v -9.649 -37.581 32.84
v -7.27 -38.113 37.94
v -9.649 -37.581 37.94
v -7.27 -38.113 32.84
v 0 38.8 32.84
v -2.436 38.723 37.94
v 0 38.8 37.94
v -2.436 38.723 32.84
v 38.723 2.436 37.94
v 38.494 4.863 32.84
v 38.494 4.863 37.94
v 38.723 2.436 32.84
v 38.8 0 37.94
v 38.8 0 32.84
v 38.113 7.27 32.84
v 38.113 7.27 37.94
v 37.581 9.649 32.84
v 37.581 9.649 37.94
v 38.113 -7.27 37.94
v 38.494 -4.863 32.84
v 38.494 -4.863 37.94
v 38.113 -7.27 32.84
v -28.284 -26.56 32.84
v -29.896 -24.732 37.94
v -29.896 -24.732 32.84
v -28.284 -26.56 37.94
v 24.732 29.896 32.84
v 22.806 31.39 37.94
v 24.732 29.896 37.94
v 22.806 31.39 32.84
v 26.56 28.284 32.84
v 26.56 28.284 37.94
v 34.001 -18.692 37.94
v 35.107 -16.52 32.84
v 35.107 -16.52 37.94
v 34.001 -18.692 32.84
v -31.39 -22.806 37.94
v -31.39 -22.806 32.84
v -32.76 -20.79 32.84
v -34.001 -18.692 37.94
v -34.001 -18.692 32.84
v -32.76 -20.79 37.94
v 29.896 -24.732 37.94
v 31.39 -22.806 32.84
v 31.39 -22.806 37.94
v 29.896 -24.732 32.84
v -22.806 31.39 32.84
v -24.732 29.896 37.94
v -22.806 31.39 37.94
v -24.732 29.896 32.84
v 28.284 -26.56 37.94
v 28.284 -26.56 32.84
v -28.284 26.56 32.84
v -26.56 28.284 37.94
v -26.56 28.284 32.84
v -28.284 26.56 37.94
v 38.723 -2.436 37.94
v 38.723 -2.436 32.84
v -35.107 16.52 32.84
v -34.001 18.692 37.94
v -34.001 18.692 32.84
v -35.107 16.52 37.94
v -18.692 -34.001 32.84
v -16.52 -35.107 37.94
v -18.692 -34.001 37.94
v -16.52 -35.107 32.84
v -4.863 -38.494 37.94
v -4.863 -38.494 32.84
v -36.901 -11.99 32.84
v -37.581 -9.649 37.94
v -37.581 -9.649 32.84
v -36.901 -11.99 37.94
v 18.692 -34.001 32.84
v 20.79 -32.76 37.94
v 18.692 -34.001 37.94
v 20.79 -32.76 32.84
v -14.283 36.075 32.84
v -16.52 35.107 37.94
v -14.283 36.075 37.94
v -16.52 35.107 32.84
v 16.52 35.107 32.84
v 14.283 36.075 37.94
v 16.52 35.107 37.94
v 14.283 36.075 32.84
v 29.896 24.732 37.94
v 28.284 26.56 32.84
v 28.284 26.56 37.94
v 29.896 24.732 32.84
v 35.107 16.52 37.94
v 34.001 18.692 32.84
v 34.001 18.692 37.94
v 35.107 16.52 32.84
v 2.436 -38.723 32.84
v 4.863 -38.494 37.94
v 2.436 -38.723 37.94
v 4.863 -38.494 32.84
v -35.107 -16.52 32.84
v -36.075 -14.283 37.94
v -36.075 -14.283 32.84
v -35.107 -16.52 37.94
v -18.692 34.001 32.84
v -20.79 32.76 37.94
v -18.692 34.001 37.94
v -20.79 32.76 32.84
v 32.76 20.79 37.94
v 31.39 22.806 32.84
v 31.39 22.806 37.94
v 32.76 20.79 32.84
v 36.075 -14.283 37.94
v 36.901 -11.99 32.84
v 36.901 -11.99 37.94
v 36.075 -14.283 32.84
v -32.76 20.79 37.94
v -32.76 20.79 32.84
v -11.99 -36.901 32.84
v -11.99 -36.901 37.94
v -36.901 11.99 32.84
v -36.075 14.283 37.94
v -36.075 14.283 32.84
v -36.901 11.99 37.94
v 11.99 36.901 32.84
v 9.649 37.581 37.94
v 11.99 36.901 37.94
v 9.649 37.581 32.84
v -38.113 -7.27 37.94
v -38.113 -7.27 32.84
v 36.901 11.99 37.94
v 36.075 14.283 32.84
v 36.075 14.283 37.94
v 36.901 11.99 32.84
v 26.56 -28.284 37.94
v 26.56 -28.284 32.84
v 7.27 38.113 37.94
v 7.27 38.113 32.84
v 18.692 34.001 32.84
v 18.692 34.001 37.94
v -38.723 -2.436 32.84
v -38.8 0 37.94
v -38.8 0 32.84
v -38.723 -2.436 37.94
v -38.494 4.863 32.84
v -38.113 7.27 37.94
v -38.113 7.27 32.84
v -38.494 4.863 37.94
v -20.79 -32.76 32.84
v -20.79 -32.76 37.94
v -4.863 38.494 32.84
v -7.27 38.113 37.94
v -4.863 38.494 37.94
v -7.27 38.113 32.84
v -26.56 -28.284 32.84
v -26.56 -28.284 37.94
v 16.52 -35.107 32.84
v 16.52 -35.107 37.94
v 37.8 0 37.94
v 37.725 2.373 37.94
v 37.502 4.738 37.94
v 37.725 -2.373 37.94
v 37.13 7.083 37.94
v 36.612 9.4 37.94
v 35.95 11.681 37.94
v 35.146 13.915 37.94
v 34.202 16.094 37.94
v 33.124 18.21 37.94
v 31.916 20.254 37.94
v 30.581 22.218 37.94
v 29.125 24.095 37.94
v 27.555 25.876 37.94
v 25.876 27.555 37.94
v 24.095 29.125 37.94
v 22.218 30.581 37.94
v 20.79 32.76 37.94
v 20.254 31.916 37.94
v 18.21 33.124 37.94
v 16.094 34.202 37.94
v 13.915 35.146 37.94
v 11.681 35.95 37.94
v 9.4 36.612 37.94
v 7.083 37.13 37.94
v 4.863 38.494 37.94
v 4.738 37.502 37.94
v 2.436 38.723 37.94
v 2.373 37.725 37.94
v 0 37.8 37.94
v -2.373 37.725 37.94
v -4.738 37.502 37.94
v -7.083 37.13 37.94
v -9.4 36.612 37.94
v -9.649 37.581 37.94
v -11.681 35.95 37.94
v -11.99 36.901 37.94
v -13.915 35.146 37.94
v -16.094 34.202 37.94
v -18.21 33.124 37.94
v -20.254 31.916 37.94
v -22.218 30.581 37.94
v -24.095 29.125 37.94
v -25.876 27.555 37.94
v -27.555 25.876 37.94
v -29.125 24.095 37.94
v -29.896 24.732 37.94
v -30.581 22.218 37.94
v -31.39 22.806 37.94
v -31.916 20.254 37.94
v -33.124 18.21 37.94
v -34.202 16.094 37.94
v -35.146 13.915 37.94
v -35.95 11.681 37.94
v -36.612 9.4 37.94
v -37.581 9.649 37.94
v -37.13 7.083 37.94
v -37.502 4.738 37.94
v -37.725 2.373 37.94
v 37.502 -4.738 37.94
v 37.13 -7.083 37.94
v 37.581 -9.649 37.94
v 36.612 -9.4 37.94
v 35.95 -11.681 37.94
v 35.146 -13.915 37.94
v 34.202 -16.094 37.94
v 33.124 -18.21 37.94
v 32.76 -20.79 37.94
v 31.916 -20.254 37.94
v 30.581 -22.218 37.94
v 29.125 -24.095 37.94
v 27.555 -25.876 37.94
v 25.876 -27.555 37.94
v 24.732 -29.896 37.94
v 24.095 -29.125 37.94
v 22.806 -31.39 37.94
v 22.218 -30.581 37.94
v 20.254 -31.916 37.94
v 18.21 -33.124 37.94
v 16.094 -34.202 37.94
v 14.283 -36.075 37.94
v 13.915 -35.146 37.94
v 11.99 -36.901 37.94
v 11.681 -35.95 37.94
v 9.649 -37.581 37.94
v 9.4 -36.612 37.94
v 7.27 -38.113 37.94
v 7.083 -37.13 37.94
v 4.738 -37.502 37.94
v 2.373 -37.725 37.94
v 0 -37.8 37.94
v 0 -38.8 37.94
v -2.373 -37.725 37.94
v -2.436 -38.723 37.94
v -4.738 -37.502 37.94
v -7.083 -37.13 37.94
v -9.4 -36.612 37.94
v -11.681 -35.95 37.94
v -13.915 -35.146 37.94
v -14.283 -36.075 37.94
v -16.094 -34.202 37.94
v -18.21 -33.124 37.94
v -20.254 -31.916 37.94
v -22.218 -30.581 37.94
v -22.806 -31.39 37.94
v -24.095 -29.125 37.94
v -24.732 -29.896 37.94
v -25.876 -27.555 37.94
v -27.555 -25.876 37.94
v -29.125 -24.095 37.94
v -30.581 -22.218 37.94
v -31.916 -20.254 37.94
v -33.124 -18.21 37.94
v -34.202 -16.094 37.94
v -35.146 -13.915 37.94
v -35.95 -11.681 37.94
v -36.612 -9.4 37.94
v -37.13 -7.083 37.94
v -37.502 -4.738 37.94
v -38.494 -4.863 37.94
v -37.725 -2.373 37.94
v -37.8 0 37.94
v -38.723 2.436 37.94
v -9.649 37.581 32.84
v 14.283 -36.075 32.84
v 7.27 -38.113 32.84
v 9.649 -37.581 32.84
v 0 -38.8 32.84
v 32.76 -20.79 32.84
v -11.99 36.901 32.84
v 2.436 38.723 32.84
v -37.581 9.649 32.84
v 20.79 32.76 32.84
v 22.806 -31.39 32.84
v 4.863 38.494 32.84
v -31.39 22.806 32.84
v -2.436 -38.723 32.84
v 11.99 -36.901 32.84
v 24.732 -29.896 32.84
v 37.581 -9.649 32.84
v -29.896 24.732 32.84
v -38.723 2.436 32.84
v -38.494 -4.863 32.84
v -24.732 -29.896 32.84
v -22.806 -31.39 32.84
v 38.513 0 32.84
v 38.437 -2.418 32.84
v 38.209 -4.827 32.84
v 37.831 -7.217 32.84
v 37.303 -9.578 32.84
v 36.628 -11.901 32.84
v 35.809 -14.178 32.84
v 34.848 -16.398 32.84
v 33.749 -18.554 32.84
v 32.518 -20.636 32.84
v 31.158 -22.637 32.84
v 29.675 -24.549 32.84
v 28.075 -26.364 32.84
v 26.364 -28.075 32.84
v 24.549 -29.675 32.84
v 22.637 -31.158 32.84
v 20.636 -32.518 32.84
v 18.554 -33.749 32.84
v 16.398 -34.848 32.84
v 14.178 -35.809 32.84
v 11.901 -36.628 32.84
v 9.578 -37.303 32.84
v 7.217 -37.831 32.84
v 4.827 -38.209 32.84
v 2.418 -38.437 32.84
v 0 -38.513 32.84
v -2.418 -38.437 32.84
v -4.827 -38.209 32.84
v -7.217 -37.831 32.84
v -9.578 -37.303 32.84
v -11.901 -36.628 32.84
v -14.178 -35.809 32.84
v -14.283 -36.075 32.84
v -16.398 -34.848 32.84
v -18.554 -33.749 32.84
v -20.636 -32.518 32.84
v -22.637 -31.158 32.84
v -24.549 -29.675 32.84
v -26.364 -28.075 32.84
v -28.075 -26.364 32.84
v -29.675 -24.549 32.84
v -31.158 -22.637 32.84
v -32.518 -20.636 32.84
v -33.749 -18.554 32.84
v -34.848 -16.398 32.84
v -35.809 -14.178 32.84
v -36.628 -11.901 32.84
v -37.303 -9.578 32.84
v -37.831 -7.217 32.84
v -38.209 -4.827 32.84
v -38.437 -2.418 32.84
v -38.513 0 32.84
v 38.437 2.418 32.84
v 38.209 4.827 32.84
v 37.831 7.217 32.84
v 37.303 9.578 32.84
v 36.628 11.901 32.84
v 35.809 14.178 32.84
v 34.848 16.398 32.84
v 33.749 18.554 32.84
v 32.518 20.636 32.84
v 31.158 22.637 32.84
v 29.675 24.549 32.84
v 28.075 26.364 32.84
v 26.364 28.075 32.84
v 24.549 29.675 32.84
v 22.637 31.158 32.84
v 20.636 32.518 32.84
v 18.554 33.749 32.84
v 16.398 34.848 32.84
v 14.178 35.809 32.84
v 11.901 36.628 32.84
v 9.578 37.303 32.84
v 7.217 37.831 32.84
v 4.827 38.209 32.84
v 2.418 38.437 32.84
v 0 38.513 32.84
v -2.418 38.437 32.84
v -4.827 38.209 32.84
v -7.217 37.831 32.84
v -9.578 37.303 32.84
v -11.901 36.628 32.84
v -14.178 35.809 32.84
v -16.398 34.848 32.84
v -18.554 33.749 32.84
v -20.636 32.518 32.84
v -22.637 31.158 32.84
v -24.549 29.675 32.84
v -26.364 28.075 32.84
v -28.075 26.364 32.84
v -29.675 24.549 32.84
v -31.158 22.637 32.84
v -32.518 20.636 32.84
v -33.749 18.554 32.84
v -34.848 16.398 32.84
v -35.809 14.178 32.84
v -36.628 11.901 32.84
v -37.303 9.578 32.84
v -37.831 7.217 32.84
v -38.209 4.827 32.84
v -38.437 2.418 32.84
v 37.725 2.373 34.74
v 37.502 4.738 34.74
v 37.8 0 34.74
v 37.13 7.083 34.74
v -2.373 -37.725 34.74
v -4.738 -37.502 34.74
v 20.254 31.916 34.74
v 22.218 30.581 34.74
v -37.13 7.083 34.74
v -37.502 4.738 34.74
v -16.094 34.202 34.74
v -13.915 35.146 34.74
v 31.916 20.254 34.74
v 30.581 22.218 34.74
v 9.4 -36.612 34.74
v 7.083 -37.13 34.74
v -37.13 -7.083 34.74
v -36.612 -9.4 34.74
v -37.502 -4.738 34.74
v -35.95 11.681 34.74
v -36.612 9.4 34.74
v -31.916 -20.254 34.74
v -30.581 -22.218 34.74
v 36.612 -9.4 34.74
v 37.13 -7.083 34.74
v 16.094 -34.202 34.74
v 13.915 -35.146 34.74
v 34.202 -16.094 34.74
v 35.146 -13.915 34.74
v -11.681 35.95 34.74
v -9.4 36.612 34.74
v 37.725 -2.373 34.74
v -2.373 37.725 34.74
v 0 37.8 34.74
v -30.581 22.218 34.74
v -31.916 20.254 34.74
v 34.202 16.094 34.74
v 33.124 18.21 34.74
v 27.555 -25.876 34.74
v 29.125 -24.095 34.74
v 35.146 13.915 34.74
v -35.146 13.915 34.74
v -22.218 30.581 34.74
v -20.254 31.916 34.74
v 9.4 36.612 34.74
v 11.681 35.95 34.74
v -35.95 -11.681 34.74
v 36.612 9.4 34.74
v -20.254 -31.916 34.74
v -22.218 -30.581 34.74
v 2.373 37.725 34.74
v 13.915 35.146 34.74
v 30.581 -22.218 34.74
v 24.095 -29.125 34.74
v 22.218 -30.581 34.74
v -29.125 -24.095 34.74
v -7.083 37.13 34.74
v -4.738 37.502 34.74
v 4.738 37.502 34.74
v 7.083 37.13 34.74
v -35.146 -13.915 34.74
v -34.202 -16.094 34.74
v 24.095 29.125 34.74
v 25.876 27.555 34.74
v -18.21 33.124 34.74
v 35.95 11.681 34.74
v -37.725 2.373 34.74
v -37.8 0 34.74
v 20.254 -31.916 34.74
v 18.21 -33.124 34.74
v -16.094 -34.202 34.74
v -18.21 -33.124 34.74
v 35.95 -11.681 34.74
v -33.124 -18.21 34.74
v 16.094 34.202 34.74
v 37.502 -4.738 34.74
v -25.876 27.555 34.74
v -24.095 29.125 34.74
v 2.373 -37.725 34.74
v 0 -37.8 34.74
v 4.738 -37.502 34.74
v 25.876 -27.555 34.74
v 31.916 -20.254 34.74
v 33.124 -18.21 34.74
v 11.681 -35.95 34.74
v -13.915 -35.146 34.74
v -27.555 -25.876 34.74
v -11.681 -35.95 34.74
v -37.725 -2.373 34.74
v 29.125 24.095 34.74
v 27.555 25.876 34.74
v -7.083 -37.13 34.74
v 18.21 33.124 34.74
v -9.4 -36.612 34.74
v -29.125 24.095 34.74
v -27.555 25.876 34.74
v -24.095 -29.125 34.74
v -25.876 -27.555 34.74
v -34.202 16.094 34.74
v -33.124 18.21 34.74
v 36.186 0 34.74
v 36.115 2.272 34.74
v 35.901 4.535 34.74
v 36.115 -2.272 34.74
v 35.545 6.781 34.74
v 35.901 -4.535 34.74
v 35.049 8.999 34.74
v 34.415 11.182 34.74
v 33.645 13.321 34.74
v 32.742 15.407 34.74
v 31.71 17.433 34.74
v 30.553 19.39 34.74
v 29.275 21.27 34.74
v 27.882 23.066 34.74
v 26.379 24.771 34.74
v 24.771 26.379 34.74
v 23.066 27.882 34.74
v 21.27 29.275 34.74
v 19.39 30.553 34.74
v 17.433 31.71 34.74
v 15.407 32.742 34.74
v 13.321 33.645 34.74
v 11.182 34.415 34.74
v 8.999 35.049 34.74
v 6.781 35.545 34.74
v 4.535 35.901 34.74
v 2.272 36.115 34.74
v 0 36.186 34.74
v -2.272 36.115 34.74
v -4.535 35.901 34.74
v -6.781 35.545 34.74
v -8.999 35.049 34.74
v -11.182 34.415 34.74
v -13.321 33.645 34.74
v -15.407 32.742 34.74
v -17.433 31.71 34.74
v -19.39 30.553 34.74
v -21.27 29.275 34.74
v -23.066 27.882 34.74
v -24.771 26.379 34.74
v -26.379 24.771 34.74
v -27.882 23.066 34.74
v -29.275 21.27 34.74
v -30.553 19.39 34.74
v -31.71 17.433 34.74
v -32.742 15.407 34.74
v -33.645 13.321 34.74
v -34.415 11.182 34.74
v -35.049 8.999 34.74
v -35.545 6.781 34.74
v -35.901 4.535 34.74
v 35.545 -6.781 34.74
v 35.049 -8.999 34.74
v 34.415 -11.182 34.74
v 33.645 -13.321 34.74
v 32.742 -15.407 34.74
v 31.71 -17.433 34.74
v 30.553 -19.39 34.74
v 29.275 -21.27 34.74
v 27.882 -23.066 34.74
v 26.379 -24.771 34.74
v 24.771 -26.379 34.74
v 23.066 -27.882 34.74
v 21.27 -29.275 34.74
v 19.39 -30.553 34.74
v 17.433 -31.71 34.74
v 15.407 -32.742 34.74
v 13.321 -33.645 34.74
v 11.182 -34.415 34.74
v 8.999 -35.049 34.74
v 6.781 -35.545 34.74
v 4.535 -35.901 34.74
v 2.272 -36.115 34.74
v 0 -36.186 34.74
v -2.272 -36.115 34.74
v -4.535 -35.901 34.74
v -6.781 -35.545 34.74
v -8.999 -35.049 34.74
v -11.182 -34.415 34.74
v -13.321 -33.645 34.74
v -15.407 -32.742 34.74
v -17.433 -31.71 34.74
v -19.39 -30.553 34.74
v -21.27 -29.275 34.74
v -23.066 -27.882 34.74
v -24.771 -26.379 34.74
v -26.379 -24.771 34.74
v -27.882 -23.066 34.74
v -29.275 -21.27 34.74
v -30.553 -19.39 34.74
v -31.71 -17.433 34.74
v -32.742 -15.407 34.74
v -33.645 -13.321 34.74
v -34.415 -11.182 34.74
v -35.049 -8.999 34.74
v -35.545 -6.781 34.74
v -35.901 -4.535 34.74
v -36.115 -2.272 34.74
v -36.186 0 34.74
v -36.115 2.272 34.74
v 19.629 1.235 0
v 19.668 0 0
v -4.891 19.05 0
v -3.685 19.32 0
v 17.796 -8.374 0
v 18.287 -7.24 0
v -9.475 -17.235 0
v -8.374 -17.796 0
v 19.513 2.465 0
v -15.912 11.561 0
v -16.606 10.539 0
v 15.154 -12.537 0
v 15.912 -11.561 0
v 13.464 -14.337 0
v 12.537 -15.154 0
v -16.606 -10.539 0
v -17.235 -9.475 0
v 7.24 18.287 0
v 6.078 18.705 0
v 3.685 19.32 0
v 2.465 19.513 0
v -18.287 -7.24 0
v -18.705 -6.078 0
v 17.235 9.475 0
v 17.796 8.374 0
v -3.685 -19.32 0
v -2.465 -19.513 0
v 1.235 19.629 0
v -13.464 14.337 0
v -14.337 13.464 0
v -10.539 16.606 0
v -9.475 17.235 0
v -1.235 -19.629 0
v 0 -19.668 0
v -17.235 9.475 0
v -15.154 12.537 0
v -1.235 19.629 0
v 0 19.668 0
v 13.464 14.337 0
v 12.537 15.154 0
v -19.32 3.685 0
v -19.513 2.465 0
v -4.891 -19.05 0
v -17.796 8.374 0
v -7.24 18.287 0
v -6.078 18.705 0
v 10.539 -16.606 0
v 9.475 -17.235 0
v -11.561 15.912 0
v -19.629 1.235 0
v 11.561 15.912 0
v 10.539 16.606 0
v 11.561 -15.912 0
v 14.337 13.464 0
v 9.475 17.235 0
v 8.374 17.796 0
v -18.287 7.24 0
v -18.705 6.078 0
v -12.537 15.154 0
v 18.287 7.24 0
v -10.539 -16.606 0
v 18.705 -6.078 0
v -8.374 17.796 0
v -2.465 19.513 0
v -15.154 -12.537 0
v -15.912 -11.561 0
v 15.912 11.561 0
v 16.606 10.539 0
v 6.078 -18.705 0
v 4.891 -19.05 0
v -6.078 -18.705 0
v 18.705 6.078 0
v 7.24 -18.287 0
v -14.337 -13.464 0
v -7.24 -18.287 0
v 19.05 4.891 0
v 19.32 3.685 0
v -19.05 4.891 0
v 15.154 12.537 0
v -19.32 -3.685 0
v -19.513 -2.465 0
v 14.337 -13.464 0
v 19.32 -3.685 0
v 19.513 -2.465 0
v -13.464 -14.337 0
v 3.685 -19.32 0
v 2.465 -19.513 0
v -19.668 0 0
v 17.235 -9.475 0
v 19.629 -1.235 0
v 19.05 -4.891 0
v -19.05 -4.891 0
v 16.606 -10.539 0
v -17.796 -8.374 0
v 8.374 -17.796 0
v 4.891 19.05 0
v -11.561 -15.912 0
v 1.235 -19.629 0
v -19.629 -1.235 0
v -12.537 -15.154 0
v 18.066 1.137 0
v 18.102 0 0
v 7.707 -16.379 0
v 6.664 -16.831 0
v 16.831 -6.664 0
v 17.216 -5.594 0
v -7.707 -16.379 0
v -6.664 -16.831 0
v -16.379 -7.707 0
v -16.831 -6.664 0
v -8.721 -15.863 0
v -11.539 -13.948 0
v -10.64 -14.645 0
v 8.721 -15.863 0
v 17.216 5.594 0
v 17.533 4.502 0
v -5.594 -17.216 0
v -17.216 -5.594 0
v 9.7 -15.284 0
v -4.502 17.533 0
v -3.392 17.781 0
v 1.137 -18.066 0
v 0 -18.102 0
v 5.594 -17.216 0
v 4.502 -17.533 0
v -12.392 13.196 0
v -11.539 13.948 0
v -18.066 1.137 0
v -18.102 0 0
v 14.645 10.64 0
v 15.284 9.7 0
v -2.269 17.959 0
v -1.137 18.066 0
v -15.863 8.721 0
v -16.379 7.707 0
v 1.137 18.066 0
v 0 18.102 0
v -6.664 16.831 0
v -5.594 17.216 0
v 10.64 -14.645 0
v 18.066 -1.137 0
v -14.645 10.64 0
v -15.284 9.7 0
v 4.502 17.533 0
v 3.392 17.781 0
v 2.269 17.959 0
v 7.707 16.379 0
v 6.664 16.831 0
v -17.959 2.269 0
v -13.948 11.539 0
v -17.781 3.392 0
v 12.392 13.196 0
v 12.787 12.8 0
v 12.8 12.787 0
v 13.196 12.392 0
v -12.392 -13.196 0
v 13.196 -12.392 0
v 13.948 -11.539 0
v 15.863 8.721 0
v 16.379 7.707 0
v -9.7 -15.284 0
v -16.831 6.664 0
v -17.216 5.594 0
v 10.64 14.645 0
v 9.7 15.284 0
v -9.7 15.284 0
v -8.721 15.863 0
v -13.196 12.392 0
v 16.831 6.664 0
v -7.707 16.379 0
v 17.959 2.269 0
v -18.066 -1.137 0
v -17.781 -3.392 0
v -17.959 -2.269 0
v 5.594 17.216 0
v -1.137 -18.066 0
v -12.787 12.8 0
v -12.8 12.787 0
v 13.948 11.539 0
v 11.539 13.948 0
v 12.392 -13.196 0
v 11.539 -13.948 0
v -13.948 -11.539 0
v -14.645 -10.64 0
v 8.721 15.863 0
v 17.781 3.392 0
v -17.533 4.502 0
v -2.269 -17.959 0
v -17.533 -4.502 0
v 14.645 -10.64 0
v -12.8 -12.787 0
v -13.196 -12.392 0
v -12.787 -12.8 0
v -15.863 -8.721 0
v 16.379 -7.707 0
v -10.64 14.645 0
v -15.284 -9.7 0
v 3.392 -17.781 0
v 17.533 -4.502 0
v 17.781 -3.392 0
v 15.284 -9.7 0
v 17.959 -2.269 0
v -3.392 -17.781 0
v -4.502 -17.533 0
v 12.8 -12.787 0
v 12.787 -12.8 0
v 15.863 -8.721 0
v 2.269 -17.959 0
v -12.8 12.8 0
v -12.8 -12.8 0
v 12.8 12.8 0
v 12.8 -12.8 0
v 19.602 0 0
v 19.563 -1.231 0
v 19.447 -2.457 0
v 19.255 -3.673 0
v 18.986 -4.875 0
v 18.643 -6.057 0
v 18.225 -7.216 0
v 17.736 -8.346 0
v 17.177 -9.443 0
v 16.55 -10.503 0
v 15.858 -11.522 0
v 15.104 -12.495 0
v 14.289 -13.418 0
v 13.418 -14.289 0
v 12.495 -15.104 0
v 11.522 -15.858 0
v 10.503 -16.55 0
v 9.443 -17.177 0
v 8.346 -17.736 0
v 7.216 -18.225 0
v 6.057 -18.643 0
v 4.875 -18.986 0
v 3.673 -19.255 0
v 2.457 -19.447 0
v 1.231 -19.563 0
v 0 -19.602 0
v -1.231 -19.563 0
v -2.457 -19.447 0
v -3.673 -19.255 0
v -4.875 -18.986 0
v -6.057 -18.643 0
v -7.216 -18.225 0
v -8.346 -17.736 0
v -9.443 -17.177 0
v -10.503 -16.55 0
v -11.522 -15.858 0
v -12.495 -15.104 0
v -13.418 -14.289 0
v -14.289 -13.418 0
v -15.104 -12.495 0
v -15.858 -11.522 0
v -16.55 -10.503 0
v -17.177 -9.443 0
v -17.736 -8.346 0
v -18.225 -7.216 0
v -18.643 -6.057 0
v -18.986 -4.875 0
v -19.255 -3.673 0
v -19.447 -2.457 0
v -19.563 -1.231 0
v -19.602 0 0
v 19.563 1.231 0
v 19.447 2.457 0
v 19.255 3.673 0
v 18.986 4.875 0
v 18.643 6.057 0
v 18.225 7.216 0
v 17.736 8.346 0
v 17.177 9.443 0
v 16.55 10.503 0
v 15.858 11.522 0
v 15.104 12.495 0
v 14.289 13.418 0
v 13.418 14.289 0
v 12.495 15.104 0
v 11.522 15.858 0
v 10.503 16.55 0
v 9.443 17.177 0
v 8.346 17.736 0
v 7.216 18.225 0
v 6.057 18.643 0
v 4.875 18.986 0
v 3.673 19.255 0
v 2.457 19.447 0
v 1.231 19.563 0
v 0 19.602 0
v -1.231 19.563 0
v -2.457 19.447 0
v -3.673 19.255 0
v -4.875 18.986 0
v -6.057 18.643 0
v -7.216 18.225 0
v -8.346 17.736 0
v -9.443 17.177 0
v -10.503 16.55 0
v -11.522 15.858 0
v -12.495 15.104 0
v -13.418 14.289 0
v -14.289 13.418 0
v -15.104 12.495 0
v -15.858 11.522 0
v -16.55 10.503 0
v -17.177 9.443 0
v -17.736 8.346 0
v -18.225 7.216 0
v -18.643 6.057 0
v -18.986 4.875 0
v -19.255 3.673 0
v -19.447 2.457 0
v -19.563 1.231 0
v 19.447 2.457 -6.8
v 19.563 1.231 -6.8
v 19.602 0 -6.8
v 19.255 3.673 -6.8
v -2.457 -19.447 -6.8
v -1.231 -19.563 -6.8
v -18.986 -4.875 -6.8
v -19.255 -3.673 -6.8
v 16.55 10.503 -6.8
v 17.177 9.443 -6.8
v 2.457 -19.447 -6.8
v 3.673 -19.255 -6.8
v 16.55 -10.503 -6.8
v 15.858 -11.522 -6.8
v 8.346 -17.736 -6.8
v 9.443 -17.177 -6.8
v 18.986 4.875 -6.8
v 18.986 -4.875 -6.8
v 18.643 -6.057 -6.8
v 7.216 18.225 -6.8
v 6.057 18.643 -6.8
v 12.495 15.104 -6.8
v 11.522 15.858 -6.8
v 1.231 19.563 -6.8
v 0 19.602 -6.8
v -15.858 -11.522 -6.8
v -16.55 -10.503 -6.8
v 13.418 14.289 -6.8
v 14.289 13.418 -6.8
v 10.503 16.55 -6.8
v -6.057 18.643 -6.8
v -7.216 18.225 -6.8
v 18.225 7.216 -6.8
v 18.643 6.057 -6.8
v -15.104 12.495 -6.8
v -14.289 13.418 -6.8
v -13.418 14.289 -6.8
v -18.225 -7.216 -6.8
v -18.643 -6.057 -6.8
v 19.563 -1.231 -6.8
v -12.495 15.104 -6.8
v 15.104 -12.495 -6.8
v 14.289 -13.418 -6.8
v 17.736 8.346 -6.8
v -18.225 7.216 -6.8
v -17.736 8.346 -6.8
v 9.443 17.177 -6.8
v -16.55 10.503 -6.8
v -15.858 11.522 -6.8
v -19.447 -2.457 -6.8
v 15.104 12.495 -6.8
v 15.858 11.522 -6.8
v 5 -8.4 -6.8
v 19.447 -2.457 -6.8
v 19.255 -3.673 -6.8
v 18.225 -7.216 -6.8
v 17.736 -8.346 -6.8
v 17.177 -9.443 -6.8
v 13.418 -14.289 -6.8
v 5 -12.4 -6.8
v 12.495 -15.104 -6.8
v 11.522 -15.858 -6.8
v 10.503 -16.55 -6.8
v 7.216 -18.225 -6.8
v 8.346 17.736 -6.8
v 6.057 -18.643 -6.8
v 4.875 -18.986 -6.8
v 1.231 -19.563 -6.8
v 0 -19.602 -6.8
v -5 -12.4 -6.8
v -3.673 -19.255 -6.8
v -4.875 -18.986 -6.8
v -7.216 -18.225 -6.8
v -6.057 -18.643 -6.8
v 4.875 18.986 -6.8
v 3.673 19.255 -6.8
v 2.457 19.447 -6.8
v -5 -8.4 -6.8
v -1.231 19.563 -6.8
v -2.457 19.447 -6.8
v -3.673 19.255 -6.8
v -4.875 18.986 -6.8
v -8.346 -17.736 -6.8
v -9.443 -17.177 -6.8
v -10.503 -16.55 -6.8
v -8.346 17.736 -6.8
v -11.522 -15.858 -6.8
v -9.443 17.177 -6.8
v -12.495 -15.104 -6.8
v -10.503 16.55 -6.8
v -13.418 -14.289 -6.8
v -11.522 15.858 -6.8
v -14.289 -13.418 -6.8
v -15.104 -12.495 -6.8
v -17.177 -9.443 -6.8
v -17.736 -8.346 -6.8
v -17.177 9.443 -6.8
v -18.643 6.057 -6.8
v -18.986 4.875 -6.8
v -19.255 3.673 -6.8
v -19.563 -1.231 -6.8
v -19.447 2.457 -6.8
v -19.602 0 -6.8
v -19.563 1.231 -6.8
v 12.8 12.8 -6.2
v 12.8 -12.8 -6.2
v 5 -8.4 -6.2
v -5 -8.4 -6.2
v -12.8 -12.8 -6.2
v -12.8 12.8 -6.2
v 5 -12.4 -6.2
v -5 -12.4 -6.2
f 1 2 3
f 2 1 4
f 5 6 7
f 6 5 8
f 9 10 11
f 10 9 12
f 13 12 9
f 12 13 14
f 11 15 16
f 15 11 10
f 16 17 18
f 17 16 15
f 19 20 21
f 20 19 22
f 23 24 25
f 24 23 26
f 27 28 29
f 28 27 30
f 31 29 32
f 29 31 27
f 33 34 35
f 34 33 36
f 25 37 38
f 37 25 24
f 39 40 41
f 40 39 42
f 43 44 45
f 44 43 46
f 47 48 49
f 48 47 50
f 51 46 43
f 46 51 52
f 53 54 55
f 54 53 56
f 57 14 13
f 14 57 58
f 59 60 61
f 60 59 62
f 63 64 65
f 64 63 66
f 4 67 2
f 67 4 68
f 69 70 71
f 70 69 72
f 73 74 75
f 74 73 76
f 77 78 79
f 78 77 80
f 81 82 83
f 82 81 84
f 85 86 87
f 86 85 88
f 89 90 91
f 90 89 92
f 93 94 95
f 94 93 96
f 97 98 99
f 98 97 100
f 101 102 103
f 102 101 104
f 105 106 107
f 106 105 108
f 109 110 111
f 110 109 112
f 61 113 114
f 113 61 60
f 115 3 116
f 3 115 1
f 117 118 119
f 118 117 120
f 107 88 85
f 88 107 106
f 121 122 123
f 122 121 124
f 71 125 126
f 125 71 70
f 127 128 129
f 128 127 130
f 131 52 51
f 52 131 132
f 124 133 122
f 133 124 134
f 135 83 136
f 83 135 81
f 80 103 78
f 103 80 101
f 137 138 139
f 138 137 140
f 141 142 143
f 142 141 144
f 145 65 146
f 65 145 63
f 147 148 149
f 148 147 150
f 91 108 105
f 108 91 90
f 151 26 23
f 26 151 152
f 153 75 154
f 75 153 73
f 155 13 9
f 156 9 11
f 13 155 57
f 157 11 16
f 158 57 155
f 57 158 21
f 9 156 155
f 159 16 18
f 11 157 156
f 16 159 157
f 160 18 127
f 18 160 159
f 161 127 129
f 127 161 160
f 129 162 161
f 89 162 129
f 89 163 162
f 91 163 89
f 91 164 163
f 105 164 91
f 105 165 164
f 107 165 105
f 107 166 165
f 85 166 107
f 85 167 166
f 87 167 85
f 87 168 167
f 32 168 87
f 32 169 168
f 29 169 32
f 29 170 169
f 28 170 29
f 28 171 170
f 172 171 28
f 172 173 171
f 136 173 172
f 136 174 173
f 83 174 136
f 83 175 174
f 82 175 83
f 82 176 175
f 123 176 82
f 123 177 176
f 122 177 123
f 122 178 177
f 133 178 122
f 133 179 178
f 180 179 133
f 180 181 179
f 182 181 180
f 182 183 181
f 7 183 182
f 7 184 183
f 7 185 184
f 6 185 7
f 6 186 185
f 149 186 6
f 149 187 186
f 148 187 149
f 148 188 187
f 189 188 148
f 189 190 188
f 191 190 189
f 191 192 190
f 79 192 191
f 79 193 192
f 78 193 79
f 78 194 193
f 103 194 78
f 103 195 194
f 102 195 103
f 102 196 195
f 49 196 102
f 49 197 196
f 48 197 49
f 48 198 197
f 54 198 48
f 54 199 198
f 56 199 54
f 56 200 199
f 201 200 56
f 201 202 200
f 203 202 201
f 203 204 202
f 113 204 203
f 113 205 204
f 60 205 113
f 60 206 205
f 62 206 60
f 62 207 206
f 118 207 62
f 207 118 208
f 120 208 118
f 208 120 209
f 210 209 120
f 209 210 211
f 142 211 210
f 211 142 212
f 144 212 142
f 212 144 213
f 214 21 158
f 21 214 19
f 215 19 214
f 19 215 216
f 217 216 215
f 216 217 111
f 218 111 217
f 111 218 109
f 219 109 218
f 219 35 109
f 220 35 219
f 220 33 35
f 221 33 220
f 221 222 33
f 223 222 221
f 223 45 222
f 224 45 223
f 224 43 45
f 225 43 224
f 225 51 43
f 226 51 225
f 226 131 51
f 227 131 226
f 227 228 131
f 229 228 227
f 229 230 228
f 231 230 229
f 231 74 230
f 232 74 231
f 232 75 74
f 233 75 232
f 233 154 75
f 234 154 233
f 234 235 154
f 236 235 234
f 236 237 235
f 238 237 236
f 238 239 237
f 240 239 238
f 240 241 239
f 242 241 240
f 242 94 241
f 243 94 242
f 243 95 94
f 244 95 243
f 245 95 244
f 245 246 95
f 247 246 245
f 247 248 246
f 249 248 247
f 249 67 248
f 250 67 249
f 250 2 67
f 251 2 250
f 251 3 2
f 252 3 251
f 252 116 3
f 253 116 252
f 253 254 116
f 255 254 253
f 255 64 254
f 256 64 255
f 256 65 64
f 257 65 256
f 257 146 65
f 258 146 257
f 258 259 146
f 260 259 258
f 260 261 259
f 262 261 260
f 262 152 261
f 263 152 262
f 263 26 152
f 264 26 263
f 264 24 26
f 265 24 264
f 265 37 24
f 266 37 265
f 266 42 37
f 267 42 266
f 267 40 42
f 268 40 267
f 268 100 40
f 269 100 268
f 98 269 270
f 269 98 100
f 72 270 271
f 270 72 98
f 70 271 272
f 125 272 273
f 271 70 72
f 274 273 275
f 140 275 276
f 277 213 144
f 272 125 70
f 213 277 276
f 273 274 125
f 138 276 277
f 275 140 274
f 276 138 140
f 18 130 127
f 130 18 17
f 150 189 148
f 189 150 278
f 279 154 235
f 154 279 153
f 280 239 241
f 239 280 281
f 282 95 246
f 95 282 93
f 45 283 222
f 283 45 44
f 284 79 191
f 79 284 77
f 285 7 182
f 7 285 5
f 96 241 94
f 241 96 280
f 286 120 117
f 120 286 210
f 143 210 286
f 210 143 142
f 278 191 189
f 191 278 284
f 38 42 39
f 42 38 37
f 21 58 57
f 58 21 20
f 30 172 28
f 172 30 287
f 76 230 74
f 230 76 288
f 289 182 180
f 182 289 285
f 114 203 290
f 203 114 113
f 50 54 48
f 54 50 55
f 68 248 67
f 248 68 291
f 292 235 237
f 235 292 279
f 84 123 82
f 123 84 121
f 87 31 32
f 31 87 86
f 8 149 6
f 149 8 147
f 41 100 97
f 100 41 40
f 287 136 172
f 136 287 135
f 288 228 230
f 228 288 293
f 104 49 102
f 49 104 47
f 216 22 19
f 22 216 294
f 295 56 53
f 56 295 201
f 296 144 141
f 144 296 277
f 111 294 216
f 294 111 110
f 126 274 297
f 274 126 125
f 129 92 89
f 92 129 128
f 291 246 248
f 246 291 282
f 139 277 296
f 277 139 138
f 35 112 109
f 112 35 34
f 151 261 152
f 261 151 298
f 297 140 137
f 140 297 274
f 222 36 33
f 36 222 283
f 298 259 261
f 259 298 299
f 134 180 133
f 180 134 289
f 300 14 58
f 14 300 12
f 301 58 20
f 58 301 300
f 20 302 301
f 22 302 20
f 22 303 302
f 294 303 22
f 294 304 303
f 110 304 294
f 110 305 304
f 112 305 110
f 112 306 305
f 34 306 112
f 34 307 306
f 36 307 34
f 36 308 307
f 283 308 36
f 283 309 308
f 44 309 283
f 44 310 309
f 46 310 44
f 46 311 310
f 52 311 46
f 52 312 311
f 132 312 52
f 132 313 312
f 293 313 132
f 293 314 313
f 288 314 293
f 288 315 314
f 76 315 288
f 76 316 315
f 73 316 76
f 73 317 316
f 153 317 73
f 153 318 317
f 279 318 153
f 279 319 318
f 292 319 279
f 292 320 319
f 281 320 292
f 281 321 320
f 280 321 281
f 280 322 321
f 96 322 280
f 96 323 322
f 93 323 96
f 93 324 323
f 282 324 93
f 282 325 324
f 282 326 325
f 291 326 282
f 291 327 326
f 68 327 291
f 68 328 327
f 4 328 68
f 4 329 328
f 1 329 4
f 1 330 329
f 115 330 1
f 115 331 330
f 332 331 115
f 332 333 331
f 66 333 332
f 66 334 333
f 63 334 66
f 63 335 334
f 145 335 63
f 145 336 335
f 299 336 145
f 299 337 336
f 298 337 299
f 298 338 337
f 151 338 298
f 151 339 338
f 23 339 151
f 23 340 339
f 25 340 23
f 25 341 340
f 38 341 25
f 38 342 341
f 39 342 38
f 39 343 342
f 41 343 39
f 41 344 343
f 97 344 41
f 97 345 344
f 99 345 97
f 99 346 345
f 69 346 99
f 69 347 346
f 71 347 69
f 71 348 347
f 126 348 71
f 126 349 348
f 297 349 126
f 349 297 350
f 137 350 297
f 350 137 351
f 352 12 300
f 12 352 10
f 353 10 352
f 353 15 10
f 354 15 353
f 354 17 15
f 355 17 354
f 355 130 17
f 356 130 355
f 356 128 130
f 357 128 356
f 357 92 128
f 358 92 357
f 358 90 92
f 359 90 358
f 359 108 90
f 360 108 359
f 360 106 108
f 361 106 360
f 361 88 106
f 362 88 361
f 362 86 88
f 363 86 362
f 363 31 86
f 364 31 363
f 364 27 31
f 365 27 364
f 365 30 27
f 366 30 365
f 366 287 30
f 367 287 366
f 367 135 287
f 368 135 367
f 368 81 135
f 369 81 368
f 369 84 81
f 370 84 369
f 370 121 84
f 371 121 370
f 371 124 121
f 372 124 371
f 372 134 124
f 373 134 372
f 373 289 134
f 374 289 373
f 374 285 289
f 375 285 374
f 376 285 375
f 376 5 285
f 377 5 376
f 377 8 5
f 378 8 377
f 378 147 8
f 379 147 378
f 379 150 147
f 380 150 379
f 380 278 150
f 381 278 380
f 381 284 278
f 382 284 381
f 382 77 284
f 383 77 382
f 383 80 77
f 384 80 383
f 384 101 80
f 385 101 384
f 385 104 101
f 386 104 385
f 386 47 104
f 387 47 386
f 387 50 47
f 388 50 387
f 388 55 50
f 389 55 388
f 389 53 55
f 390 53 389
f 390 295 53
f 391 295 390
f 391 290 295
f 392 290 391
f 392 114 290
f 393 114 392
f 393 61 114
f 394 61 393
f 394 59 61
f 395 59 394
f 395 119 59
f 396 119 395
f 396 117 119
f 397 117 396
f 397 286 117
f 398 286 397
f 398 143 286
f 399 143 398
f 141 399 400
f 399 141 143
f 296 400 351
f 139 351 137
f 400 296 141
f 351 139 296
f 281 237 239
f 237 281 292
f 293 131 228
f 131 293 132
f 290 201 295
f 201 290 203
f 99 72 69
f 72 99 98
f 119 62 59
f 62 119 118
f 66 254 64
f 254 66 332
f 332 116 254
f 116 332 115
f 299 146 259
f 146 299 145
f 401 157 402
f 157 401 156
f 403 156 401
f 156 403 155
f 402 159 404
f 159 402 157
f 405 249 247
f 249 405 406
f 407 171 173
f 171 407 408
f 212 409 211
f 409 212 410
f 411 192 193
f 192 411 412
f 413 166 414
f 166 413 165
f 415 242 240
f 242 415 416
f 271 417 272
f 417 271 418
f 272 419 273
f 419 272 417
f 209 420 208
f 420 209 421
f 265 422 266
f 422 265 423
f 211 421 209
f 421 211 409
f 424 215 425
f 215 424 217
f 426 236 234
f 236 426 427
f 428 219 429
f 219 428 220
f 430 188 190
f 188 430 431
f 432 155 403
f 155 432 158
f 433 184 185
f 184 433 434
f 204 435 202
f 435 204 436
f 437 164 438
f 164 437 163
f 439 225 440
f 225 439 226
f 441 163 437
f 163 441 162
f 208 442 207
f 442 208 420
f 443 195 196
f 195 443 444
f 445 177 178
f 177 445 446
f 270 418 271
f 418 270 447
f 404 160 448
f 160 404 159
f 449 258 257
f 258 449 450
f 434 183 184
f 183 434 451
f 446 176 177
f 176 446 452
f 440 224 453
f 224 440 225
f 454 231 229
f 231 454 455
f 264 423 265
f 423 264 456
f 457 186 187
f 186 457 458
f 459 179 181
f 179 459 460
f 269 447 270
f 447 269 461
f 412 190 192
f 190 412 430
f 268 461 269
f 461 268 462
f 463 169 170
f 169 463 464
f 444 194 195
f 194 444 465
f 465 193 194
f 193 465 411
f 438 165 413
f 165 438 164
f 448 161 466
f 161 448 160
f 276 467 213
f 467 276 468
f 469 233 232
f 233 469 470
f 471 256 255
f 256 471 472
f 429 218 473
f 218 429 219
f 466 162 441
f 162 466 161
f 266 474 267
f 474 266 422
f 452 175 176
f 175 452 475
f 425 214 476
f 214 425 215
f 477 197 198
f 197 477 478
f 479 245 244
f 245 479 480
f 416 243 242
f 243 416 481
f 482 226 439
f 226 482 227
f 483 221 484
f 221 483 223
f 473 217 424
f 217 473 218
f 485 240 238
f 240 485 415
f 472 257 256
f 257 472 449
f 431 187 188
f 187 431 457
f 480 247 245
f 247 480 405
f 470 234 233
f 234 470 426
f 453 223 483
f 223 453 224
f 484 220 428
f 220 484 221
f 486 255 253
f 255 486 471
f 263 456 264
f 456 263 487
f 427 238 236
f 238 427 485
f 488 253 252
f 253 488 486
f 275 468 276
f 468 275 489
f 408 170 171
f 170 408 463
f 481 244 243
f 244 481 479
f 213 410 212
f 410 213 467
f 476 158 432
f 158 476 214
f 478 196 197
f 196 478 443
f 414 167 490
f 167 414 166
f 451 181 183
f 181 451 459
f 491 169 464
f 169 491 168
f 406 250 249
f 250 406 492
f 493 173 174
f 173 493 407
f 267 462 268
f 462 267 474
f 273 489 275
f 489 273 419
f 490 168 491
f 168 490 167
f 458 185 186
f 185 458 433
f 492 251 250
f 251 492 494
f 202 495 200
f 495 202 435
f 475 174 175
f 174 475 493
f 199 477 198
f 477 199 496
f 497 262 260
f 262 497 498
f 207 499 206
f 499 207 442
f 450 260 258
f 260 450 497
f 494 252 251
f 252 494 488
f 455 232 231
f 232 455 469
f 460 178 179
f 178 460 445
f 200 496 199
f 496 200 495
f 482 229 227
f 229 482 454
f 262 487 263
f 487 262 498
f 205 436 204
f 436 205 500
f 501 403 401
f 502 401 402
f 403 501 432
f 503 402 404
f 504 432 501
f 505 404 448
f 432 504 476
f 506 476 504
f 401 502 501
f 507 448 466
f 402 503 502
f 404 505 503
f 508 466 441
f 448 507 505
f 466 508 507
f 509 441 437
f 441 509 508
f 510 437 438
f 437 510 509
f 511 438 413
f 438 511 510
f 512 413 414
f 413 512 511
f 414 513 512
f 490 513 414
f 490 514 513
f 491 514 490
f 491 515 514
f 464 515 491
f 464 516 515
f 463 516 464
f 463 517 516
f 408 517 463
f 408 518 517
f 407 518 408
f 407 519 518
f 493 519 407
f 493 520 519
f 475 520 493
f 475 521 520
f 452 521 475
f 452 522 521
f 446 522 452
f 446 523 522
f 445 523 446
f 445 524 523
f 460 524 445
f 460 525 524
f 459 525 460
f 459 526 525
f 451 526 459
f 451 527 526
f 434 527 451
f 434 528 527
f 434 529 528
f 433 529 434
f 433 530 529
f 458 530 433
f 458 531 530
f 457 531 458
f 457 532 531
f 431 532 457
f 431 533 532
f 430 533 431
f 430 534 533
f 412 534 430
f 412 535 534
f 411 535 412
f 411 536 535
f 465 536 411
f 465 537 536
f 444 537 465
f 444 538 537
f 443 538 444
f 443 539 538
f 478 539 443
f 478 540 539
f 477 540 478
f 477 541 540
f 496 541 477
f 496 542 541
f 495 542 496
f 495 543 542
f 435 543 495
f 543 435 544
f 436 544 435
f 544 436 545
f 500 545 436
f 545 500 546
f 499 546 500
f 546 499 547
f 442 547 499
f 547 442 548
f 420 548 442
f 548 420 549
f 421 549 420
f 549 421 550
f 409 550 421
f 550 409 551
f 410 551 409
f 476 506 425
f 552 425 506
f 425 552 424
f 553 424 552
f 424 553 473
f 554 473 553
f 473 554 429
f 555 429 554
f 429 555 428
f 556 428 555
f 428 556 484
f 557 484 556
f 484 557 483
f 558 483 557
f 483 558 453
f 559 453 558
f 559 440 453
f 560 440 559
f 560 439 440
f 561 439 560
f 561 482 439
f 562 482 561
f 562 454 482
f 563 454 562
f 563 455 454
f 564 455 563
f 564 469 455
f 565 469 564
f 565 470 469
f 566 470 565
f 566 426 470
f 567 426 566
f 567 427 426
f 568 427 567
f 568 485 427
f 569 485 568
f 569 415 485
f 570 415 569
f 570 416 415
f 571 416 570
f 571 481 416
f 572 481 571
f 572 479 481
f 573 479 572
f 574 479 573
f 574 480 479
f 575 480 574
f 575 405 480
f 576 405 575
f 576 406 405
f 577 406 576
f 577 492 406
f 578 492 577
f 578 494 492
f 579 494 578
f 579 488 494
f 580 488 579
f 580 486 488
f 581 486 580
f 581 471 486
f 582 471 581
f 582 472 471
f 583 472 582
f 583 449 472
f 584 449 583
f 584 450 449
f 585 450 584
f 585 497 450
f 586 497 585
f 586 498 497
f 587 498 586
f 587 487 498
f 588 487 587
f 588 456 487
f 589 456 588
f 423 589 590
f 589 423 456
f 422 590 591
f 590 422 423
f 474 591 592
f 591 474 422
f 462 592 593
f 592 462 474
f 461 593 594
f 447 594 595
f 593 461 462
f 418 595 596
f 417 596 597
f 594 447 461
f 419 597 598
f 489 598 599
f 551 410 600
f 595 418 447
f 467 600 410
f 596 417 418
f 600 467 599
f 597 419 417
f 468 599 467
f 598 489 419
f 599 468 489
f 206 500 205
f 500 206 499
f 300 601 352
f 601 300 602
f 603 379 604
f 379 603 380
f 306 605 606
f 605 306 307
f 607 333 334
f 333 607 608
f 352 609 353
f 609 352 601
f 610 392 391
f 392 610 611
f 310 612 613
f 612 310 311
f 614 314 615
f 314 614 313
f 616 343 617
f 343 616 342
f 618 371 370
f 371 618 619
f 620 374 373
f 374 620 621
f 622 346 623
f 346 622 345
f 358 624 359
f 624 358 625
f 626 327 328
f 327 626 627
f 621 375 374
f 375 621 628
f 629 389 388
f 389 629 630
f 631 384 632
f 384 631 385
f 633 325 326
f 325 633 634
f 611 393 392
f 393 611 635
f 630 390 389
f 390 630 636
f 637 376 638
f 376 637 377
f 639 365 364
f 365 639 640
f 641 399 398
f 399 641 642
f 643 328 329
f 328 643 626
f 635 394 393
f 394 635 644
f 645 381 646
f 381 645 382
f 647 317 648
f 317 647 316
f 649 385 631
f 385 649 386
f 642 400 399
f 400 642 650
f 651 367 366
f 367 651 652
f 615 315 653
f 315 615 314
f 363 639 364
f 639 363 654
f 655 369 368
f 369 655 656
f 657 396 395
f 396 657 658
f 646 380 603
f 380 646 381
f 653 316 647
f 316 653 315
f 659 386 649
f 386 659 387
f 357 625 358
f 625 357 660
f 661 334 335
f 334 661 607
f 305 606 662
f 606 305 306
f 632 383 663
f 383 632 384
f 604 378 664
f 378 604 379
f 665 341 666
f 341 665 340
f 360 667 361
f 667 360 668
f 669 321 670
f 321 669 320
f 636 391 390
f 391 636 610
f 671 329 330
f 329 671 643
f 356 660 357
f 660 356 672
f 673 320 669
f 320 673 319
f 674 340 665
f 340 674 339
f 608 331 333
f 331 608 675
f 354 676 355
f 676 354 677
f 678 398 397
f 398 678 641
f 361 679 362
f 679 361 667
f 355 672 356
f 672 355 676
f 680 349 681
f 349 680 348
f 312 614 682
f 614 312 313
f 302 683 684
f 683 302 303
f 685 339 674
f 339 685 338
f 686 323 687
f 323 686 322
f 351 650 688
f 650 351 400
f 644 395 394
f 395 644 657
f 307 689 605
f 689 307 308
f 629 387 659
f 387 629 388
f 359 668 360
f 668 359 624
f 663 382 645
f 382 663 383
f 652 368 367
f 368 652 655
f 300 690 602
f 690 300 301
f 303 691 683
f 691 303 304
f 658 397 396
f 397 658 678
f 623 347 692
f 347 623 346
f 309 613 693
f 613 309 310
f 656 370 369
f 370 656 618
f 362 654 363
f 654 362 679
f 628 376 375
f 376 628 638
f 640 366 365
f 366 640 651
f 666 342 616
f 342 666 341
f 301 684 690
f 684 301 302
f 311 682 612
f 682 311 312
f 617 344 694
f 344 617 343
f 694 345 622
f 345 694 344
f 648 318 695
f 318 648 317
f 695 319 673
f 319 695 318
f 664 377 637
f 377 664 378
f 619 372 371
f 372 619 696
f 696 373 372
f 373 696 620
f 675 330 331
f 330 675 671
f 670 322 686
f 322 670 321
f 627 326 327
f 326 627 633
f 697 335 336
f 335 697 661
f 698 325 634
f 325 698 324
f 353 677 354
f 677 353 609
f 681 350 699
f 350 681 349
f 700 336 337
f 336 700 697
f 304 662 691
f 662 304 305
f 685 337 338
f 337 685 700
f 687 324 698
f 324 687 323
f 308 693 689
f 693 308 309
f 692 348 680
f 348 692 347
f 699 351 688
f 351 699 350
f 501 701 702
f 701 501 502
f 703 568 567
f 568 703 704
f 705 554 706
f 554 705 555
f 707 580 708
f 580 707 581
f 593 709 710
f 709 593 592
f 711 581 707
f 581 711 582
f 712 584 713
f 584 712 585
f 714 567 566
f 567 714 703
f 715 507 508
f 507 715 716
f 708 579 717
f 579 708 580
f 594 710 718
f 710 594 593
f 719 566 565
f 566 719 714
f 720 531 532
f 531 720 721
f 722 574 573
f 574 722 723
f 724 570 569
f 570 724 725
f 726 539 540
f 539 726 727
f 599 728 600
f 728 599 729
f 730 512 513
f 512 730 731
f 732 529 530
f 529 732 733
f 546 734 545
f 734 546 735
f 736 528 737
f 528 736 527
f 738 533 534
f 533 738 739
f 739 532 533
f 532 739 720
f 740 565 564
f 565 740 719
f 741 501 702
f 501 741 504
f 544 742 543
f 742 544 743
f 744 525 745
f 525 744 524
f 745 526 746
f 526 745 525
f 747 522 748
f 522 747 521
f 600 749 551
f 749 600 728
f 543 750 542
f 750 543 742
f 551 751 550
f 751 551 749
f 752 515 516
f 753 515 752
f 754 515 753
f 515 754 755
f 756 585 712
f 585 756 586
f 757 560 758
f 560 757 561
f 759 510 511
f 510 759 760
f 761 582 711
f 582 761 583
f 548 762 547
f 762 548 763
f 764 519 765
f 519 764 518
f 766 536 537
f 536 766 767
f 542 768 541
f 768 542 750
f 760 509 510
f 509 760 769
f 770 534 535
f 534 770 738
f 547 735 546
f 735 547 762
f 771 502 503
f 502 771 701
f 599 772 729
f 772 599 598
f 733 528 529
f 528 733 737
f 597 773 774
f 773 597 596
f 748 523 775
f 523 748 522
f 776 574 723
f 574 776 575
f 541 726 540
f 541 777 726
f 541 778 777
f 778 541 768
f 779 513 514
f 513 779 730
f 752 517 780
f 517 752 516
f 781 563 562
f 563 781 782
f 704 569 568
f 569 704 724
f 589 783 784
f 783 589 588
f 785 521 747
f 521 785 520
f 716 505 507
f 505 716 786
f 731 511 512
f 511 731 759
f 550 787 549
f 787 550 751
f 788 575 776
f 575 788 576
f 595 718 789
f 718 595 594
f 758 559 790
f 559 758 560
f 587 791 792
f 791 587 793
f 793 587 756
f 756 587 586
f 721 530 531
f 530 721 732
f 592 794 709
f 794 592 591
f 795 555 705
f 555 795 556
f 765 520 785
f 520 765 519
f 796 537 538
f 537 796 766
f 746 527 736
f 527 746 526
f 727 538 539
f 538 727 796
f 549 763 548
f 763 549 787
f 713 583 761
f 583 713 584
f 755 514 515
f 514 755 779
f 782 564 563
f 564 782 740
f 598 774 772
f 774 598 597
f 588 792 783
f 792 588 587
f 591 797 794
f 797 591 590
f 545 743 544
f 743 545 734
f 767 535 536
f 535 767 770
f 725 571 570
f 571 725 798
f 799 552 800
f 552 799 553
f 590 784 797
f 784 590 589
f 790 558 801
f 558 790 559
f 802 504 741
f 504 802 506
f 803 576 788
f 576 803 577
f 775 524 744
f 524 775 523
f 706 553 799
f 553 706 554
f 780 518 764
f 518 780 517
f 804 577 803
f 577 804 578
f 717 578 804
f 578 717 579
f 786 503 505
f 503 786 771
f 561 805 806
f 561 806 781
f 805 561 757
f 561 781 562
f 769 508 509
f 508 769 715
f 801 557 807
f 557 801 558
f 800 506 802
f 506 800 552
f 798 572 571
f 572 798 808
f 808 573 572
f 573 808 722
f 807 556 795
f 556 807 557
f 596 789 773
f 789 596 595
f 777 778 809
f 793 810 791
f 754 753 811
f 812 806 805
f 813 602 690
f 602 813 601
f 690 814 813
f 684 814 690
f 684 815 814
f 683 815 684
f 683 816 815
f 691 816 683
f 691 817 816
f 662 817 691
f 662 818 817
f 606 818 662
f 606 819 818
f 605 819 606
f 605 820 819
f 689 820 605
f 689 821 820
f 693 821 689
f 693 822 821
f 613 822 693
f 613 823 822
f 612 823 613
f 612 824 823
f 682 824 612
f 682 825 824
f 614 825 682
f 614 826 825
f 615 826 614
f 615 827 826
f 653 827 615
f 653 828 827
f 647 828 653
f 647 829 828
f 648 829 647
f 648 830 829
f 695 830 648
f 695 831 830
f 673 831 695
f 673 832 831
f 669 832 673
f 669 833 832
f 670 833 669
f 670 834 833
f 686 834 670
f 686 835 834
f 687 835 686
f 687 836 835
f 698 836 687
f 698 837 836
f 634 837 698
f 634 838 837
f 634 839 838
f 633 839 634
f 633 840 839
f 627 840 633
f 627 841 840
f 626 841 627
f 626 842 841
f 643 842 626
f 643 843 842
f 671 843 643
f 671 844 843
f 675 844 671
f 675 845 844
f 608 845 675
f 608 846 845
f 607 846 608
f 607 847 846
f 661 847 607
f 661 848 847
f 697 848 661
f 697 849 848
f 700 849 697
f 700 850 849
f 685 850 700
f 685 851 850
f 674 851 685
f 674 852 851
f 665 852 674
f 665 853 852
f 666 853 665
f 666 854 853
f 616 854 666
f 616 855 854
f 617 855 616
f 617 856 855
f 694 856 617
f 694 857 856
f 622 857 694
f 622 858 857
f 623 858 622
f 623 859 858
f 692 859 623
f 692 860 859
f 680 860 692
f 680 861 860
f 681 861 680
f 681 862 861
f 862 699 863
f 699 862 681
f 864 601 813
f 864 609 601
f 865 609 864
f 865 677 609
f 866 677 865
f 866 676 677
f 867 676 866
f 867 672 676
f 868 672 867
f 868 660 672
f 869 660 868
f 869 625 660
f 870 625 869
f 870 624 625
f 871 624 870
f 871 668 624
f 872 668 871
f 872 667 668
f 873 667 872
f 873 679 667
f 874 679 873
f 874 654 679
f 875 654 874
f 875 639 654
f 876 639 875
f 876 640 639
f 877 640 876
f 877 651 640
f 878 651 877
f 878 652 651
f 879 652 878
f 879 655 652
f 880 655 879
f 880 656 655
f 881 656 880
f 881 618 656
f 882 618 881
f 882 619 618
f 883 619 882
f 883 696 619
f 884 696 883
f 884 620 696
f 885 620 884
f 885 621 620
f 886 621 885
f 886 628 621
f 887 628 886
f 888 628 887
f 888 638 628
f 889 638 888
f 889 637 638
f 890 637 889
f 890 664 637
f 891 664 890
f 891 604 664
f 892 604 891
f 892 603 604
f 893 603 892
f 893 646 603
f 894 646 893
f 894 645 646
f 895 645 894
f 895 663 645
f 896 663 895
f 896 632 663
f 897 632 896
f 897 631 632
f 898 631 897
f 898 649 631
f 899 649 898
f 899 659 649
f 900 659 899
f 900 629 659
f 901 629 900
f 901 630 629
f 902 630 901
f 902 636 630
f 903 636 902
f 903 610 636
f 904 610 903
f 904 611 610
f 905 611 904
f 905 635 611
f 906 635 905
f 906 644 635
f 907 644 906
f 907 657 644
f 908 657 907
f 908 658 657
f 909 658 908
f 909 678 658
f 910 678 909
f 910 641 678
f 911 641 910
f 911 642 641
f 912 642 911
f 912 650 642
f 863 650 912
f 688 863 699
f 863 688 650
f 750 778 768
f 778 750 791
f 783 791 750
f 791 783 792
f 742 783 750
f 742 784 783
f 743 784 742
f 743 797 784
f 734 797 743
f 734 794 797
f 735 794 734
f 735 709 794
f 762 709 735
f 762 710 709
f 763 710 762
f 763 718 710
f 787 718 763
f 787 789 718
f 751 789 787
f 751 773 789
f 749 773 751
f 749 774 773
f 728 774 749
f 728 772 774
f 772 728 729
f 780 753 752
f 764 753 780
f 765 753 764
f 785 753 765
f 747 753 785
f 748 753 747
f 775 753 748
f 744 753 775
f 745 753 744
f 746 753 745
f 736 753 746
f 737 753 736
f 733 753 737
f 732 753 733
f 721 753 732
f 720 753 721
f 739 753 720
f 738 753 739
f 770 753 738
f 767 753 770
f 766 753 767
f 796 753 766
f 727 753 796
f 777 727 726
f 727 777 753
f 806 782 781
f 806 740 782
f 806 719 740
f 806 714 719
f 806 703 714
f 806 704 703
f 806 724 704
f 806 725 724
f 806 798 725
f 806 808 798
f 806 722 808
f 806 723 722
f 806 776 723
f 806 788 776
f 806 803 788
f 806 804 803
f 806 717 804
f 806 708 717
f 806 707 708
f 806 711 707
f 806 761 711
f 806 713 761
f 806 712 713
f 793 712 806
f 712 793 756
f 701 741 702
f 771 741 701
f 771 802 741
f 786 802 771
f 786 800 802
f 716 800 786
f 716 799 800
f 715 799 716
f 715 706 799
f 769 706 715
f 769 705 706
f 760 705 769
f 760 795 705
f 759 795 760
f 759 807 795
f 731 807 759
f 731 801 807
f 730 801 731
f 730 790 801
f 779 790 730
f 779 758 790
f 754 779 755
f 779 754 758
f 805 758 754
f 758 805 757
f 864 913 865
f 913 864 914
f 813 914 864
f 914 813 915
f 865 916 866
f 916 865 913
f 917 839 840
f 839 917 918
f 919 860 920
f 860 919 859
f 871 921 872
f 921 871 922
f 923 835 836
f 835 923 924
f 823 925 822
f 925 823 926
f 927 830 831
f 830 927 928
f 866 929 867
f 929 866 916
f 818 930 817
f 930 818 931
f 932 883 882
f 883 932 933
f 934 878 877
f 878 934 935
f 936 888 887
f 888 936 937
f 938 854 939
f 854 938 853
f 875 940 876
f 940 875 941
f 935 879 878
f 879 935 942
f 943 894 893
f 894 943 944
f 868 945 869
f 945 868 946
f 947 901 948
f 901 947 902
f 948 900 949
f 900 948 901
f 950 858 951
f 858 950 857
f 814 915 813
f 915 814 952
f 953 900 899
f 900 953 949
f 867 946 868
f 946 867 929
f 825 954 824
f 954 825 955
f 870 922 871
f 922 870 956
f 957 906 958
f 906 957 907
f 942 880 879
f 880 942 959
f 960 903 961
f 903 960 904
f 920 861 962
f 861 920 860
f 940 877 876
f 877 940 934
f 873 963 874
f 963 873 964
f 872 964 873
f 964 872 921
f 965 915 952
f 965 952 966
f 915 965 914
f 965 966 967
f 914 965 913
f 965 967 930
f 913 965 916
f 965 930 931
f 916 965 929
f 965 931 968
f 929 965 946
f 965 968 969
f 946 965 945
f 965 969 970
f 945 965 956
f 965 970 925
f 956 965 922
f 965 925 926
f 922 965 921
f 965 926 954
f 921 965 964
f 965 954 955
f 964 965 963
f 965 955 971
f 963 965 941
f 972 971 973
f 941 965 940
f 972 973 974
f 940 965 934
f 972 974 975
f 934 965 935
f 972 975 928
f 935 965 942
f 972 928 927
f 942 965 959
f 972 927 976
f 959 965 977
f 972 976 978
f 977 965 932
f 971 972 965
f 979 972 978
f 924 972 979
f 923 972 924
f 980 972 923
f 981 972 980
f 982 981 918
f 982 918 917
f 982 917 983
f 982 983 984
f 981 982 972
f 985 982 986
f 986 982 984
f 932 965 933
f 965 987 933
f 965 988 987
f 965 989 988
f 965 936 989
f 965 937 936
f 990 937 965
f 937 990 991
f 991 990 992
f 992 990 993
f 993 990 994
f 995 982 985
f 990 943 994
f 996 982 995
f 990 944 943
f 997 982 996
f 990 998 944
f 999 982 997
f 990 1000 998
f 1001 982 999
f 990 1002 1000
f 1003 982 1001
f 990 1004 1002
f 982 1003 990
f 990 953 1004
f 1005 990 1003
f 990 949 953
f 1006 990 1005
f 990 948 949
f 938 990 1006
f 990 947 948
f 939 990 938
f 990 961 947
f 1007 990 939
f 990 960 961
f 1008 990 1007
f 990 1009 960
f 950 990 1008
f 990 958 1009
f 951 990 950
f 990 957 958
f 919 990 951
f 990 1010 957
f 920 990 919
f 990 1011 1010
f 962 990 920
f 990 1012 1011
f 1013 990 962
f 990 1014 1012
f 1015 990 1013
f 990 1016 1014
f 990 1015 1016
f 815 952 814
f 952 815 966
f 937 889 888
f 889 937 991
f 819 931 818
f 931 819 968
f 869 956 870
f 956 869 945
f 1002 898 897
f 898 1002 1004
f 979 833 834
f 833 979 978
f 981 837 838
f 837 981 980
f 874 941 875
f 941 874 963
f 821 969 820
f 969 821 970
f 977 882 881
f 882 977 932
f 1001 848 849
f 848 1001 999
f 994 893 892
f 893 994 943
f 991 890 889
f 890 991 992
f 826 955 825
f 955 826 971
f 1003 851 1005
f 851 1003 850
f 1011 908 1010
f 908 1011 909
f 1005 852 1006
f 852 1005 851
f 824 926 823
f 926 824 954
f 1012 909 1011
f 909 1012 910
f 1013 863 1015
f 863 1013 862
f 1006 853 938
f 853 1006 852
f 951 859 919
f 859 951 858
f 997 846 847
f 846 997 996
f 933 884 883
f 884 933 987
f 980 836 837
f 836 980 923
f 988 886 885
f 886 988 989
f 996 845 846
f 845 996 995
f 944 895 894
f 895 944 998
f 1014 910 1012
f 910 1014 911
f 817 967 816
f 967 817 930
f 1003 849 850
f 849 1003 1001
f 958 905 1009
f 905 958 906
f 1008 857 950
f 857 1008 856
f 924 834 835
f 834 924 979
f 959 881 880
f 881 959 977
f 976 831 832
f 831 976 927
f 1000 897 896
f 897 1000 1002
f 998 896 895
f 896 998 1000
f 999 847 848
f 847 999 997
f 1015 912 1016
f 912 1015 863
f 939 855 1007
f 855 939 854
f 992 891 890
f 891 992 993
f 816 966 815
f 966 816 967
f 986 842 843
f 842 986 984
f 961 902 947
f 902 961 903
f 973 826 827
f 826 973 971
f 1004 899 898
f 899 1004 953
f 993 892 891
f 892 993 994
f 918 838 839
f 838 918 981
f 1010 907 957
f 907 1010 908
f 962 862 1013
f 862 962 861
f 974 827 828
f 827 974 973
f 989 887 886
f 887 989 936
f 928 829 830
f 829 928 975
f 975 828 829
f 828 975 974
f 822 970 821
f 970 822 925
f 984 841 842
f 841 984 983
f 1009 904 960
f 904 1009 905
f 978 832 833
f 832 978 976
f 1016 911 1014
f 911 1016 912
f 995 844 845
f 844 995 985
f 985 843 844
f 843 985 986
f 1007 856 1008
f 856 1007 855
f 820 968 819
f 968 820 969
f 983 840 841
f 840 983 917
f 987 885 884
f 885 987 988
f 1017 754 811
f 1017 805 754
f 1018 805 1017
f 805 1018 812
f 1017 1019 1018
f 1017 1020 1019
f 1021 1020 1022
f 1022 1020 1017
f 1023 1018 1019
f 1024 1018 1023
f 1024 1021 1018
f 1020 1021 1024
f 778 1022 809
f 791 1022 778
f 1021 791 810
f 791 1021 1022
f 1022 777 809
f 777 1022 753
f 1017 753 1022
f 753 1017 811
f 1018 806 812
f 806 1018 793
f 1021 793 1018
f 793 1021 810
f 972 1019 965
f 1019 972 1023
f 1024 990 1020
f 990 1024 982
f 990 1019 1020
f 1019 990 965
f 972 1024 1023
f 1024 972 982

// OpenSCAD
// ===  rect -> circular horn antenna
// ===  J.Beale August 23 2018

e1 = 0.2;       // tolerance for ID shrink
OD1 = 75.4+e1;	// OD of "3-inch" round retroreflector
RFZ2 = 4.8;    // full z-height of round reflector
RFZ = 3.1;     // z-height step of round ref. edge
RFWT = 1;     // front lip wall thickness
ODFL = OD1 + (RFWT*2);  // OD of front lip
RFZE = 2;      // extra Z overlap with cone

e = 0.4;        // extra ID for slop
TXD = 25.2+e;	// Transmitter PCB X dim
TYD = 25.2+e;   // Transmitter PCB Y DIM
// OA1 = 36;     // opening angle of horn in degrees
OA1 = 55;     // opening angle of horn in degrees
TH1 = 0.8;    // wall thickness of horn

PCBZ = 6.8;     // z-height of PCB mounting
phX = 10;       // length of hole for PCB pins
phY = 4;        // width of hold for pins
phZ = 50;       // height of cutout block for pins
phYT = -10.4;   // Y axis translation of hole from center

PI = 3.14159265358979;  // constant
SQR2 = sqrt(2);  // constant
OD2 = TXD * SQR2;  // enclosing circle for PCB

OA1R = OA1 * PI / 180;  // angle in radians
ZH0 = (OD1/2) / tan(OA1/2);
ZHd = (OD2/2) / tan(OA1/2);
Zd = 3;  // vertical shift to create wall thickness
bt = 0.6; // bottom wall thickness
// =========================================
fn = 100;	// number of facets on cylinder
eps = 0.1; // a small number

// block to remove hole for PCB pins (3x on 0.1" centers)
module pcbHole() {
    translate([0,phYT,0])
      cube([phX,phY,phZ],center=true);
}

module cone1() {
    // front lip to hold edge of round cover
 difference() {
  translate([0,0,ZH0-ZHd-Zd-RFZE]) cylinder(d = ODFL, h = RFZ+RFZE, $fn=fn);   
  translate([0,0,ZH0-ZHd-Zd-eps]) cylinder(d = OD1, h = RFZ+2*eps, $fn=fn);   
 }

  translate([0,0,-ZHd-Zd+3.5]) {
    cylinder(d1 = 0, d2=ODFL, h=ZH0-5, center=false,$fn=fn); // outer conical shell
  }
}

module cone2() {
  translate([0,0,-ZHd]) {
    cylinder(d1 = 0, d2=OD1, h=ZH0, center=false,$fn=fn); // inner conical shell
  }
}

module shell1() {
    difference() {
        cone1();
        cone2();
    }
}

module bottom1() {
  translate([0,0,-PCBZ/2]) {
    cylinder(d=TXD*SQR2+Zd, h=PCBZ, center=true,$fn=fn); 
      // bottom pcb holder side  
  }
    
}

// ========================================

// round cover in front
// color("red") { translate([0,0,5+ZH0-ZHd-Zd]) cylinder(d = OD1, h = RFZ, $fn=fn);    }



module assy1() {


// main cone
intersection() {
  translate([0,0,+OD1/2]) cube([ODFL,ODFL,OD1],center=true);
  shell1();
 }

// bottom PCB holder    
difference() {
  bottom1();  // enclosing cylinder
  translate([0,0,bt-PCBZ/2]) cube([TXD,TYD,PCBZ],center=true); // pocket
  pcbHole();  // hole for pins
}
 
} // assy1()

intersection() {
  assy1();
  // translate([0,-100,-100])  cube([200,200,200]);
    
}
